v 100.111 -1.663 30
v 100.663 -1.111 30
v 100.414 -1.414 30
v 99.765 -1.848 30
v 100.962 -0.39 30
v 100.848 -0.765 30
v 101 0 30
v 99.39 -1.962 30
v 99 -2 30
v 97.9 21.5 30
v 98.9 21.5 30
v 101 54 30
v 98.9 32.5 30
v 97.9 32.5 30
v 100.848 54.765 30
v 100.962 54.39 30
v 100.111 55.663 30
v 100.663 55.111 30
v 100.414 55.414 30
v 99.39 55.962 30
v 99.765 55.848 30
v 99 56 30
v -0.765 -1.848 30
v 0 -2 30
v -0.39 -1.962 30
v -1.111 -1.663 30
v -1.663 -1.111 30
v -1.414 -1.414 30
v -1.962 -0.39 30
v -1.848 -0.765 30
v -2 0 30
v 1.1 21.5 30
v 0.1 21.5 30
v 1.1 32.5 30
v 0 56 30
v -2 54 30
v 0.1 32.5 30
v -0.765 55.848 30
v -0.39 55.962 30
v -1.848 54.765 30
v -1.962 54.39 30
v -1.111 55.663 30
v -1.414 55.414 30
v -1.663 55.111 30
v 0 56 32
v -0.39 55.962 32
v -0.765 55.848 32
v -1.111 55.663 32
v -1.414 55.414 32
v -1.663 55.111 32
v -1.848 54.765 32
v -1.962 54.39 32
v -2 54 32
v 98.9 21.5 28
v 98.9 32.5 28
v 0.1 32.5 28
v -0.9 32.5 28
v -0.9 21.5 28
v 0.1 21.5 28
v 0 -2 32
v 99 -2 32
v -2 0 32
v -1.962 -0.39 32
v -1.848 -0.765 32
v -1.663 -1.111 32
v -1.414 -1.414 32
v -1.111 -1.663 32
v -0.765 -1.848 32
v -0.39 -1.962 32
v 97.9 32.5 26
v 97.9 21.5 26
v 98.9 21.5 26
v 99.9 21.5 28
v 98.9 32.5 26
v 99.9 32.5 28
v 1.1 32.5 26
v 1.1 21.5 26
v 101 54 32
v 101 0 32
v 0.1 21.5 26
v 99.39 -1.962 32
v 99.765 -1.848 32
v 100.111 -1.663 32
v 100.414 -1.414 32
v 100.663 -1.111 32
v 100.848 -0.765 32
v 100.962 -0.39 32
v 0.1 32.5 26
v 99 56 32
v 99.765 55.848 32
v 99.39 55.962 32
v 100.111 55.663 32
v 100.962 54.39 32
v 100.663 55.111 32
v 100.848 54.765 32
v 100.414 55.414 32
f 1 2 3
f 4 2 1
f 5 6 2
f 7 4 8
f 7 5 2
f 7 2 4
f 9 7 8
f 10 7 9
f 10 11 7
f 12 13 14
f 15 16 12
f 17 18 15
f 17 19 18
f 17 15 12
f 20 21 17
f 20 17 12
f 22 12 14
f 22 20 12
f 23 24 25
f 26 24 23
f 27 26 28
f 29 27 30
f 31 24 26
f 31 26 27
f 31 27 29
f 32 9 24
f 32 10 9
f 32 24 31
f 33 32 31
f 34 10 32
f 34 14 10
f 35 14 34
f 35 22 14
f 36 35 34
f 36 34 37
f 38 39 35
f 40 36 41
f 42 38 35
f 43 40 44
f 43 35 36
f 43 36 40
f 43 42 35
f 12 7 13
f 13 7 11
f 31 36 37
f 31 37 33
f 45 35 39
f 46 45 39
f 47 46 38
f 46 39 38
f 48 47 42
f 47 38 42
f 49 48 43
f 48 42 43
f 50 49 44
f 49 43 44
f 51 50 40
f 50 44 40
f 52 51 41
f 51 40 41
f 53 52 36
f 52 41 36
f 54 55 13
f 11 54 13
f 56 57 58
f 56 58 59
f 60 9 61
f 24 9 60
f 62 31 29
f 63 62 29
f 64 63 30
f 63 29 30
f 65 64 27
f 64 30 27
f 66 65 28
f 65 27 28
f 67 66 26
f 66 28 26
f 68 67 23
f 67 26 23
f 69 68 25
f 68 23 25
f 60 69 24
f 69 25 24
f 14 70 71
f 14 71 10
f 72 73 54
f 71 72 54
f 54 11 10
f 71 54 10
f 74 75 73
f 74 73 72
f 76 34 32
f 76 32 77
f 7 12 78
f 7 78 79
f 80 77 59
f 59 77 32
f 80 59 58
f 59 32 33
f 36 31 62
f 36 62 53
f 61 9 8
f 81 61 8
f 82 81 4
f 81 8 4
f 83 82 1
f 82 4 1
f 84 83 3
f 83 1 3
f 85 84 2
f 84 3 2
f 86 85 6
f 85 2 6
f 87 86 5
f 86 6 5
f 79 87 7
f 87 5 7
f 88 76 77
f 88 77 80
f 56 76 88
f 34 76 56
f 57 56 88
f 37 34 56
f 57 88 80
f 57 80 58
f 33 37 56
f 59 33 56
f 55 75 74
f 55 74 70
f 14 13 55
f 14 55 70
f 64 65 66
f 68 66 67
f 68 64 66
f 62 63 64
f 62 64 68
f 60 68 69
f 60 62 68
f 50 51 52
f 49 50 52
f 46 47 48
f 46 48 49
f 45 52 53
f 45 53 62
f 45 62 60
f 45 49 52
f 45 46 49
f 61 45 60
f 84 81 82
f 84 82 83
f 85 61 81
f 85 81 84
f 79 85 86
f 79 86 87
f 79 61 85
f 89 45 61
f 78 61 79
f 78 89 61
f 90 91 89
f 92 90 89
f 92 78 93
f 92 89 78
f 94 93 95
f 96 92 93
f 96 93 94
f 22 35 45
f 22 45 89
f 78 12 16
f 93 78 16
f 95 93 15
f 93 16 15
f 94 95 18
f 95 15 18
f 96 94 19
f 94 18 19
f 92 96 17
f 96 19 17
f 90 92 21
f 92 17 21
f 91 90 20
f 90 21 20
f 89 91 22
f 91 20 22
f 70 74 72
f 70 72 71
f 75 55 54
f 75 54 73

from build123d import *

# Parameters (mm, degrees)
PAD002_DEPTH = 11
PAD001_DEPTH = 2


with BuildPart() as latches:
    # Sketch002 → Pad002 (new body)
    with BuildSketch(Plane.XZ):
        Polygon((1.5, 0), (1.5, -4), (0.5, -4), (-0.5, -2), (0.5, -2), (0.5, 0), (0.5, 0.5), (99.3, 0.5), (99.3, 0), (99.3, -2), (100.3, -2), (99.3, -4), (98.3, -4), (98.3, 0), align=None)
    extrude(amount=PAD002_DEPTH)


with BuildPart() as latches_1:
    # Body002 placement: moved
    add(latches.part.moved(Location((-0.4, 32.5, 0))))


with BuildPart() as lidfull:
    # Sketch001 → Pad001 (new body)
    with BuildSketch(Plane.XY):
        with BuildLine():
            ThreePointArc((0, 56), (-1.414214, 55.414214), (-2, 54))
            Line((-2, 0), (-2, 54))
            ThreePointArc((-2, 0), (-1.414214, -1.414214), (0, -2))
            Line((99, -2), (0, -2))
            ThreePointArc((99, -2), (100.414214, -1.414214), (101, 0))
            Line((101, 54), (101, 0))
            ThreePointArc((101, 54), (100.414214, 55.414214), (99, 56))
            Line((0, 56), (99, 56))
        make_face()
    extrude(amount=PAD001_DEPTH)

    # Fusion002: union Latches
    add(latches_1.part)


with BuildPart() as lidfull_1:
    # Fusion002 placement: moved
    add(lidfull.part.moved(Location((0, 0, 30))))


solid = lidfull_1.part
